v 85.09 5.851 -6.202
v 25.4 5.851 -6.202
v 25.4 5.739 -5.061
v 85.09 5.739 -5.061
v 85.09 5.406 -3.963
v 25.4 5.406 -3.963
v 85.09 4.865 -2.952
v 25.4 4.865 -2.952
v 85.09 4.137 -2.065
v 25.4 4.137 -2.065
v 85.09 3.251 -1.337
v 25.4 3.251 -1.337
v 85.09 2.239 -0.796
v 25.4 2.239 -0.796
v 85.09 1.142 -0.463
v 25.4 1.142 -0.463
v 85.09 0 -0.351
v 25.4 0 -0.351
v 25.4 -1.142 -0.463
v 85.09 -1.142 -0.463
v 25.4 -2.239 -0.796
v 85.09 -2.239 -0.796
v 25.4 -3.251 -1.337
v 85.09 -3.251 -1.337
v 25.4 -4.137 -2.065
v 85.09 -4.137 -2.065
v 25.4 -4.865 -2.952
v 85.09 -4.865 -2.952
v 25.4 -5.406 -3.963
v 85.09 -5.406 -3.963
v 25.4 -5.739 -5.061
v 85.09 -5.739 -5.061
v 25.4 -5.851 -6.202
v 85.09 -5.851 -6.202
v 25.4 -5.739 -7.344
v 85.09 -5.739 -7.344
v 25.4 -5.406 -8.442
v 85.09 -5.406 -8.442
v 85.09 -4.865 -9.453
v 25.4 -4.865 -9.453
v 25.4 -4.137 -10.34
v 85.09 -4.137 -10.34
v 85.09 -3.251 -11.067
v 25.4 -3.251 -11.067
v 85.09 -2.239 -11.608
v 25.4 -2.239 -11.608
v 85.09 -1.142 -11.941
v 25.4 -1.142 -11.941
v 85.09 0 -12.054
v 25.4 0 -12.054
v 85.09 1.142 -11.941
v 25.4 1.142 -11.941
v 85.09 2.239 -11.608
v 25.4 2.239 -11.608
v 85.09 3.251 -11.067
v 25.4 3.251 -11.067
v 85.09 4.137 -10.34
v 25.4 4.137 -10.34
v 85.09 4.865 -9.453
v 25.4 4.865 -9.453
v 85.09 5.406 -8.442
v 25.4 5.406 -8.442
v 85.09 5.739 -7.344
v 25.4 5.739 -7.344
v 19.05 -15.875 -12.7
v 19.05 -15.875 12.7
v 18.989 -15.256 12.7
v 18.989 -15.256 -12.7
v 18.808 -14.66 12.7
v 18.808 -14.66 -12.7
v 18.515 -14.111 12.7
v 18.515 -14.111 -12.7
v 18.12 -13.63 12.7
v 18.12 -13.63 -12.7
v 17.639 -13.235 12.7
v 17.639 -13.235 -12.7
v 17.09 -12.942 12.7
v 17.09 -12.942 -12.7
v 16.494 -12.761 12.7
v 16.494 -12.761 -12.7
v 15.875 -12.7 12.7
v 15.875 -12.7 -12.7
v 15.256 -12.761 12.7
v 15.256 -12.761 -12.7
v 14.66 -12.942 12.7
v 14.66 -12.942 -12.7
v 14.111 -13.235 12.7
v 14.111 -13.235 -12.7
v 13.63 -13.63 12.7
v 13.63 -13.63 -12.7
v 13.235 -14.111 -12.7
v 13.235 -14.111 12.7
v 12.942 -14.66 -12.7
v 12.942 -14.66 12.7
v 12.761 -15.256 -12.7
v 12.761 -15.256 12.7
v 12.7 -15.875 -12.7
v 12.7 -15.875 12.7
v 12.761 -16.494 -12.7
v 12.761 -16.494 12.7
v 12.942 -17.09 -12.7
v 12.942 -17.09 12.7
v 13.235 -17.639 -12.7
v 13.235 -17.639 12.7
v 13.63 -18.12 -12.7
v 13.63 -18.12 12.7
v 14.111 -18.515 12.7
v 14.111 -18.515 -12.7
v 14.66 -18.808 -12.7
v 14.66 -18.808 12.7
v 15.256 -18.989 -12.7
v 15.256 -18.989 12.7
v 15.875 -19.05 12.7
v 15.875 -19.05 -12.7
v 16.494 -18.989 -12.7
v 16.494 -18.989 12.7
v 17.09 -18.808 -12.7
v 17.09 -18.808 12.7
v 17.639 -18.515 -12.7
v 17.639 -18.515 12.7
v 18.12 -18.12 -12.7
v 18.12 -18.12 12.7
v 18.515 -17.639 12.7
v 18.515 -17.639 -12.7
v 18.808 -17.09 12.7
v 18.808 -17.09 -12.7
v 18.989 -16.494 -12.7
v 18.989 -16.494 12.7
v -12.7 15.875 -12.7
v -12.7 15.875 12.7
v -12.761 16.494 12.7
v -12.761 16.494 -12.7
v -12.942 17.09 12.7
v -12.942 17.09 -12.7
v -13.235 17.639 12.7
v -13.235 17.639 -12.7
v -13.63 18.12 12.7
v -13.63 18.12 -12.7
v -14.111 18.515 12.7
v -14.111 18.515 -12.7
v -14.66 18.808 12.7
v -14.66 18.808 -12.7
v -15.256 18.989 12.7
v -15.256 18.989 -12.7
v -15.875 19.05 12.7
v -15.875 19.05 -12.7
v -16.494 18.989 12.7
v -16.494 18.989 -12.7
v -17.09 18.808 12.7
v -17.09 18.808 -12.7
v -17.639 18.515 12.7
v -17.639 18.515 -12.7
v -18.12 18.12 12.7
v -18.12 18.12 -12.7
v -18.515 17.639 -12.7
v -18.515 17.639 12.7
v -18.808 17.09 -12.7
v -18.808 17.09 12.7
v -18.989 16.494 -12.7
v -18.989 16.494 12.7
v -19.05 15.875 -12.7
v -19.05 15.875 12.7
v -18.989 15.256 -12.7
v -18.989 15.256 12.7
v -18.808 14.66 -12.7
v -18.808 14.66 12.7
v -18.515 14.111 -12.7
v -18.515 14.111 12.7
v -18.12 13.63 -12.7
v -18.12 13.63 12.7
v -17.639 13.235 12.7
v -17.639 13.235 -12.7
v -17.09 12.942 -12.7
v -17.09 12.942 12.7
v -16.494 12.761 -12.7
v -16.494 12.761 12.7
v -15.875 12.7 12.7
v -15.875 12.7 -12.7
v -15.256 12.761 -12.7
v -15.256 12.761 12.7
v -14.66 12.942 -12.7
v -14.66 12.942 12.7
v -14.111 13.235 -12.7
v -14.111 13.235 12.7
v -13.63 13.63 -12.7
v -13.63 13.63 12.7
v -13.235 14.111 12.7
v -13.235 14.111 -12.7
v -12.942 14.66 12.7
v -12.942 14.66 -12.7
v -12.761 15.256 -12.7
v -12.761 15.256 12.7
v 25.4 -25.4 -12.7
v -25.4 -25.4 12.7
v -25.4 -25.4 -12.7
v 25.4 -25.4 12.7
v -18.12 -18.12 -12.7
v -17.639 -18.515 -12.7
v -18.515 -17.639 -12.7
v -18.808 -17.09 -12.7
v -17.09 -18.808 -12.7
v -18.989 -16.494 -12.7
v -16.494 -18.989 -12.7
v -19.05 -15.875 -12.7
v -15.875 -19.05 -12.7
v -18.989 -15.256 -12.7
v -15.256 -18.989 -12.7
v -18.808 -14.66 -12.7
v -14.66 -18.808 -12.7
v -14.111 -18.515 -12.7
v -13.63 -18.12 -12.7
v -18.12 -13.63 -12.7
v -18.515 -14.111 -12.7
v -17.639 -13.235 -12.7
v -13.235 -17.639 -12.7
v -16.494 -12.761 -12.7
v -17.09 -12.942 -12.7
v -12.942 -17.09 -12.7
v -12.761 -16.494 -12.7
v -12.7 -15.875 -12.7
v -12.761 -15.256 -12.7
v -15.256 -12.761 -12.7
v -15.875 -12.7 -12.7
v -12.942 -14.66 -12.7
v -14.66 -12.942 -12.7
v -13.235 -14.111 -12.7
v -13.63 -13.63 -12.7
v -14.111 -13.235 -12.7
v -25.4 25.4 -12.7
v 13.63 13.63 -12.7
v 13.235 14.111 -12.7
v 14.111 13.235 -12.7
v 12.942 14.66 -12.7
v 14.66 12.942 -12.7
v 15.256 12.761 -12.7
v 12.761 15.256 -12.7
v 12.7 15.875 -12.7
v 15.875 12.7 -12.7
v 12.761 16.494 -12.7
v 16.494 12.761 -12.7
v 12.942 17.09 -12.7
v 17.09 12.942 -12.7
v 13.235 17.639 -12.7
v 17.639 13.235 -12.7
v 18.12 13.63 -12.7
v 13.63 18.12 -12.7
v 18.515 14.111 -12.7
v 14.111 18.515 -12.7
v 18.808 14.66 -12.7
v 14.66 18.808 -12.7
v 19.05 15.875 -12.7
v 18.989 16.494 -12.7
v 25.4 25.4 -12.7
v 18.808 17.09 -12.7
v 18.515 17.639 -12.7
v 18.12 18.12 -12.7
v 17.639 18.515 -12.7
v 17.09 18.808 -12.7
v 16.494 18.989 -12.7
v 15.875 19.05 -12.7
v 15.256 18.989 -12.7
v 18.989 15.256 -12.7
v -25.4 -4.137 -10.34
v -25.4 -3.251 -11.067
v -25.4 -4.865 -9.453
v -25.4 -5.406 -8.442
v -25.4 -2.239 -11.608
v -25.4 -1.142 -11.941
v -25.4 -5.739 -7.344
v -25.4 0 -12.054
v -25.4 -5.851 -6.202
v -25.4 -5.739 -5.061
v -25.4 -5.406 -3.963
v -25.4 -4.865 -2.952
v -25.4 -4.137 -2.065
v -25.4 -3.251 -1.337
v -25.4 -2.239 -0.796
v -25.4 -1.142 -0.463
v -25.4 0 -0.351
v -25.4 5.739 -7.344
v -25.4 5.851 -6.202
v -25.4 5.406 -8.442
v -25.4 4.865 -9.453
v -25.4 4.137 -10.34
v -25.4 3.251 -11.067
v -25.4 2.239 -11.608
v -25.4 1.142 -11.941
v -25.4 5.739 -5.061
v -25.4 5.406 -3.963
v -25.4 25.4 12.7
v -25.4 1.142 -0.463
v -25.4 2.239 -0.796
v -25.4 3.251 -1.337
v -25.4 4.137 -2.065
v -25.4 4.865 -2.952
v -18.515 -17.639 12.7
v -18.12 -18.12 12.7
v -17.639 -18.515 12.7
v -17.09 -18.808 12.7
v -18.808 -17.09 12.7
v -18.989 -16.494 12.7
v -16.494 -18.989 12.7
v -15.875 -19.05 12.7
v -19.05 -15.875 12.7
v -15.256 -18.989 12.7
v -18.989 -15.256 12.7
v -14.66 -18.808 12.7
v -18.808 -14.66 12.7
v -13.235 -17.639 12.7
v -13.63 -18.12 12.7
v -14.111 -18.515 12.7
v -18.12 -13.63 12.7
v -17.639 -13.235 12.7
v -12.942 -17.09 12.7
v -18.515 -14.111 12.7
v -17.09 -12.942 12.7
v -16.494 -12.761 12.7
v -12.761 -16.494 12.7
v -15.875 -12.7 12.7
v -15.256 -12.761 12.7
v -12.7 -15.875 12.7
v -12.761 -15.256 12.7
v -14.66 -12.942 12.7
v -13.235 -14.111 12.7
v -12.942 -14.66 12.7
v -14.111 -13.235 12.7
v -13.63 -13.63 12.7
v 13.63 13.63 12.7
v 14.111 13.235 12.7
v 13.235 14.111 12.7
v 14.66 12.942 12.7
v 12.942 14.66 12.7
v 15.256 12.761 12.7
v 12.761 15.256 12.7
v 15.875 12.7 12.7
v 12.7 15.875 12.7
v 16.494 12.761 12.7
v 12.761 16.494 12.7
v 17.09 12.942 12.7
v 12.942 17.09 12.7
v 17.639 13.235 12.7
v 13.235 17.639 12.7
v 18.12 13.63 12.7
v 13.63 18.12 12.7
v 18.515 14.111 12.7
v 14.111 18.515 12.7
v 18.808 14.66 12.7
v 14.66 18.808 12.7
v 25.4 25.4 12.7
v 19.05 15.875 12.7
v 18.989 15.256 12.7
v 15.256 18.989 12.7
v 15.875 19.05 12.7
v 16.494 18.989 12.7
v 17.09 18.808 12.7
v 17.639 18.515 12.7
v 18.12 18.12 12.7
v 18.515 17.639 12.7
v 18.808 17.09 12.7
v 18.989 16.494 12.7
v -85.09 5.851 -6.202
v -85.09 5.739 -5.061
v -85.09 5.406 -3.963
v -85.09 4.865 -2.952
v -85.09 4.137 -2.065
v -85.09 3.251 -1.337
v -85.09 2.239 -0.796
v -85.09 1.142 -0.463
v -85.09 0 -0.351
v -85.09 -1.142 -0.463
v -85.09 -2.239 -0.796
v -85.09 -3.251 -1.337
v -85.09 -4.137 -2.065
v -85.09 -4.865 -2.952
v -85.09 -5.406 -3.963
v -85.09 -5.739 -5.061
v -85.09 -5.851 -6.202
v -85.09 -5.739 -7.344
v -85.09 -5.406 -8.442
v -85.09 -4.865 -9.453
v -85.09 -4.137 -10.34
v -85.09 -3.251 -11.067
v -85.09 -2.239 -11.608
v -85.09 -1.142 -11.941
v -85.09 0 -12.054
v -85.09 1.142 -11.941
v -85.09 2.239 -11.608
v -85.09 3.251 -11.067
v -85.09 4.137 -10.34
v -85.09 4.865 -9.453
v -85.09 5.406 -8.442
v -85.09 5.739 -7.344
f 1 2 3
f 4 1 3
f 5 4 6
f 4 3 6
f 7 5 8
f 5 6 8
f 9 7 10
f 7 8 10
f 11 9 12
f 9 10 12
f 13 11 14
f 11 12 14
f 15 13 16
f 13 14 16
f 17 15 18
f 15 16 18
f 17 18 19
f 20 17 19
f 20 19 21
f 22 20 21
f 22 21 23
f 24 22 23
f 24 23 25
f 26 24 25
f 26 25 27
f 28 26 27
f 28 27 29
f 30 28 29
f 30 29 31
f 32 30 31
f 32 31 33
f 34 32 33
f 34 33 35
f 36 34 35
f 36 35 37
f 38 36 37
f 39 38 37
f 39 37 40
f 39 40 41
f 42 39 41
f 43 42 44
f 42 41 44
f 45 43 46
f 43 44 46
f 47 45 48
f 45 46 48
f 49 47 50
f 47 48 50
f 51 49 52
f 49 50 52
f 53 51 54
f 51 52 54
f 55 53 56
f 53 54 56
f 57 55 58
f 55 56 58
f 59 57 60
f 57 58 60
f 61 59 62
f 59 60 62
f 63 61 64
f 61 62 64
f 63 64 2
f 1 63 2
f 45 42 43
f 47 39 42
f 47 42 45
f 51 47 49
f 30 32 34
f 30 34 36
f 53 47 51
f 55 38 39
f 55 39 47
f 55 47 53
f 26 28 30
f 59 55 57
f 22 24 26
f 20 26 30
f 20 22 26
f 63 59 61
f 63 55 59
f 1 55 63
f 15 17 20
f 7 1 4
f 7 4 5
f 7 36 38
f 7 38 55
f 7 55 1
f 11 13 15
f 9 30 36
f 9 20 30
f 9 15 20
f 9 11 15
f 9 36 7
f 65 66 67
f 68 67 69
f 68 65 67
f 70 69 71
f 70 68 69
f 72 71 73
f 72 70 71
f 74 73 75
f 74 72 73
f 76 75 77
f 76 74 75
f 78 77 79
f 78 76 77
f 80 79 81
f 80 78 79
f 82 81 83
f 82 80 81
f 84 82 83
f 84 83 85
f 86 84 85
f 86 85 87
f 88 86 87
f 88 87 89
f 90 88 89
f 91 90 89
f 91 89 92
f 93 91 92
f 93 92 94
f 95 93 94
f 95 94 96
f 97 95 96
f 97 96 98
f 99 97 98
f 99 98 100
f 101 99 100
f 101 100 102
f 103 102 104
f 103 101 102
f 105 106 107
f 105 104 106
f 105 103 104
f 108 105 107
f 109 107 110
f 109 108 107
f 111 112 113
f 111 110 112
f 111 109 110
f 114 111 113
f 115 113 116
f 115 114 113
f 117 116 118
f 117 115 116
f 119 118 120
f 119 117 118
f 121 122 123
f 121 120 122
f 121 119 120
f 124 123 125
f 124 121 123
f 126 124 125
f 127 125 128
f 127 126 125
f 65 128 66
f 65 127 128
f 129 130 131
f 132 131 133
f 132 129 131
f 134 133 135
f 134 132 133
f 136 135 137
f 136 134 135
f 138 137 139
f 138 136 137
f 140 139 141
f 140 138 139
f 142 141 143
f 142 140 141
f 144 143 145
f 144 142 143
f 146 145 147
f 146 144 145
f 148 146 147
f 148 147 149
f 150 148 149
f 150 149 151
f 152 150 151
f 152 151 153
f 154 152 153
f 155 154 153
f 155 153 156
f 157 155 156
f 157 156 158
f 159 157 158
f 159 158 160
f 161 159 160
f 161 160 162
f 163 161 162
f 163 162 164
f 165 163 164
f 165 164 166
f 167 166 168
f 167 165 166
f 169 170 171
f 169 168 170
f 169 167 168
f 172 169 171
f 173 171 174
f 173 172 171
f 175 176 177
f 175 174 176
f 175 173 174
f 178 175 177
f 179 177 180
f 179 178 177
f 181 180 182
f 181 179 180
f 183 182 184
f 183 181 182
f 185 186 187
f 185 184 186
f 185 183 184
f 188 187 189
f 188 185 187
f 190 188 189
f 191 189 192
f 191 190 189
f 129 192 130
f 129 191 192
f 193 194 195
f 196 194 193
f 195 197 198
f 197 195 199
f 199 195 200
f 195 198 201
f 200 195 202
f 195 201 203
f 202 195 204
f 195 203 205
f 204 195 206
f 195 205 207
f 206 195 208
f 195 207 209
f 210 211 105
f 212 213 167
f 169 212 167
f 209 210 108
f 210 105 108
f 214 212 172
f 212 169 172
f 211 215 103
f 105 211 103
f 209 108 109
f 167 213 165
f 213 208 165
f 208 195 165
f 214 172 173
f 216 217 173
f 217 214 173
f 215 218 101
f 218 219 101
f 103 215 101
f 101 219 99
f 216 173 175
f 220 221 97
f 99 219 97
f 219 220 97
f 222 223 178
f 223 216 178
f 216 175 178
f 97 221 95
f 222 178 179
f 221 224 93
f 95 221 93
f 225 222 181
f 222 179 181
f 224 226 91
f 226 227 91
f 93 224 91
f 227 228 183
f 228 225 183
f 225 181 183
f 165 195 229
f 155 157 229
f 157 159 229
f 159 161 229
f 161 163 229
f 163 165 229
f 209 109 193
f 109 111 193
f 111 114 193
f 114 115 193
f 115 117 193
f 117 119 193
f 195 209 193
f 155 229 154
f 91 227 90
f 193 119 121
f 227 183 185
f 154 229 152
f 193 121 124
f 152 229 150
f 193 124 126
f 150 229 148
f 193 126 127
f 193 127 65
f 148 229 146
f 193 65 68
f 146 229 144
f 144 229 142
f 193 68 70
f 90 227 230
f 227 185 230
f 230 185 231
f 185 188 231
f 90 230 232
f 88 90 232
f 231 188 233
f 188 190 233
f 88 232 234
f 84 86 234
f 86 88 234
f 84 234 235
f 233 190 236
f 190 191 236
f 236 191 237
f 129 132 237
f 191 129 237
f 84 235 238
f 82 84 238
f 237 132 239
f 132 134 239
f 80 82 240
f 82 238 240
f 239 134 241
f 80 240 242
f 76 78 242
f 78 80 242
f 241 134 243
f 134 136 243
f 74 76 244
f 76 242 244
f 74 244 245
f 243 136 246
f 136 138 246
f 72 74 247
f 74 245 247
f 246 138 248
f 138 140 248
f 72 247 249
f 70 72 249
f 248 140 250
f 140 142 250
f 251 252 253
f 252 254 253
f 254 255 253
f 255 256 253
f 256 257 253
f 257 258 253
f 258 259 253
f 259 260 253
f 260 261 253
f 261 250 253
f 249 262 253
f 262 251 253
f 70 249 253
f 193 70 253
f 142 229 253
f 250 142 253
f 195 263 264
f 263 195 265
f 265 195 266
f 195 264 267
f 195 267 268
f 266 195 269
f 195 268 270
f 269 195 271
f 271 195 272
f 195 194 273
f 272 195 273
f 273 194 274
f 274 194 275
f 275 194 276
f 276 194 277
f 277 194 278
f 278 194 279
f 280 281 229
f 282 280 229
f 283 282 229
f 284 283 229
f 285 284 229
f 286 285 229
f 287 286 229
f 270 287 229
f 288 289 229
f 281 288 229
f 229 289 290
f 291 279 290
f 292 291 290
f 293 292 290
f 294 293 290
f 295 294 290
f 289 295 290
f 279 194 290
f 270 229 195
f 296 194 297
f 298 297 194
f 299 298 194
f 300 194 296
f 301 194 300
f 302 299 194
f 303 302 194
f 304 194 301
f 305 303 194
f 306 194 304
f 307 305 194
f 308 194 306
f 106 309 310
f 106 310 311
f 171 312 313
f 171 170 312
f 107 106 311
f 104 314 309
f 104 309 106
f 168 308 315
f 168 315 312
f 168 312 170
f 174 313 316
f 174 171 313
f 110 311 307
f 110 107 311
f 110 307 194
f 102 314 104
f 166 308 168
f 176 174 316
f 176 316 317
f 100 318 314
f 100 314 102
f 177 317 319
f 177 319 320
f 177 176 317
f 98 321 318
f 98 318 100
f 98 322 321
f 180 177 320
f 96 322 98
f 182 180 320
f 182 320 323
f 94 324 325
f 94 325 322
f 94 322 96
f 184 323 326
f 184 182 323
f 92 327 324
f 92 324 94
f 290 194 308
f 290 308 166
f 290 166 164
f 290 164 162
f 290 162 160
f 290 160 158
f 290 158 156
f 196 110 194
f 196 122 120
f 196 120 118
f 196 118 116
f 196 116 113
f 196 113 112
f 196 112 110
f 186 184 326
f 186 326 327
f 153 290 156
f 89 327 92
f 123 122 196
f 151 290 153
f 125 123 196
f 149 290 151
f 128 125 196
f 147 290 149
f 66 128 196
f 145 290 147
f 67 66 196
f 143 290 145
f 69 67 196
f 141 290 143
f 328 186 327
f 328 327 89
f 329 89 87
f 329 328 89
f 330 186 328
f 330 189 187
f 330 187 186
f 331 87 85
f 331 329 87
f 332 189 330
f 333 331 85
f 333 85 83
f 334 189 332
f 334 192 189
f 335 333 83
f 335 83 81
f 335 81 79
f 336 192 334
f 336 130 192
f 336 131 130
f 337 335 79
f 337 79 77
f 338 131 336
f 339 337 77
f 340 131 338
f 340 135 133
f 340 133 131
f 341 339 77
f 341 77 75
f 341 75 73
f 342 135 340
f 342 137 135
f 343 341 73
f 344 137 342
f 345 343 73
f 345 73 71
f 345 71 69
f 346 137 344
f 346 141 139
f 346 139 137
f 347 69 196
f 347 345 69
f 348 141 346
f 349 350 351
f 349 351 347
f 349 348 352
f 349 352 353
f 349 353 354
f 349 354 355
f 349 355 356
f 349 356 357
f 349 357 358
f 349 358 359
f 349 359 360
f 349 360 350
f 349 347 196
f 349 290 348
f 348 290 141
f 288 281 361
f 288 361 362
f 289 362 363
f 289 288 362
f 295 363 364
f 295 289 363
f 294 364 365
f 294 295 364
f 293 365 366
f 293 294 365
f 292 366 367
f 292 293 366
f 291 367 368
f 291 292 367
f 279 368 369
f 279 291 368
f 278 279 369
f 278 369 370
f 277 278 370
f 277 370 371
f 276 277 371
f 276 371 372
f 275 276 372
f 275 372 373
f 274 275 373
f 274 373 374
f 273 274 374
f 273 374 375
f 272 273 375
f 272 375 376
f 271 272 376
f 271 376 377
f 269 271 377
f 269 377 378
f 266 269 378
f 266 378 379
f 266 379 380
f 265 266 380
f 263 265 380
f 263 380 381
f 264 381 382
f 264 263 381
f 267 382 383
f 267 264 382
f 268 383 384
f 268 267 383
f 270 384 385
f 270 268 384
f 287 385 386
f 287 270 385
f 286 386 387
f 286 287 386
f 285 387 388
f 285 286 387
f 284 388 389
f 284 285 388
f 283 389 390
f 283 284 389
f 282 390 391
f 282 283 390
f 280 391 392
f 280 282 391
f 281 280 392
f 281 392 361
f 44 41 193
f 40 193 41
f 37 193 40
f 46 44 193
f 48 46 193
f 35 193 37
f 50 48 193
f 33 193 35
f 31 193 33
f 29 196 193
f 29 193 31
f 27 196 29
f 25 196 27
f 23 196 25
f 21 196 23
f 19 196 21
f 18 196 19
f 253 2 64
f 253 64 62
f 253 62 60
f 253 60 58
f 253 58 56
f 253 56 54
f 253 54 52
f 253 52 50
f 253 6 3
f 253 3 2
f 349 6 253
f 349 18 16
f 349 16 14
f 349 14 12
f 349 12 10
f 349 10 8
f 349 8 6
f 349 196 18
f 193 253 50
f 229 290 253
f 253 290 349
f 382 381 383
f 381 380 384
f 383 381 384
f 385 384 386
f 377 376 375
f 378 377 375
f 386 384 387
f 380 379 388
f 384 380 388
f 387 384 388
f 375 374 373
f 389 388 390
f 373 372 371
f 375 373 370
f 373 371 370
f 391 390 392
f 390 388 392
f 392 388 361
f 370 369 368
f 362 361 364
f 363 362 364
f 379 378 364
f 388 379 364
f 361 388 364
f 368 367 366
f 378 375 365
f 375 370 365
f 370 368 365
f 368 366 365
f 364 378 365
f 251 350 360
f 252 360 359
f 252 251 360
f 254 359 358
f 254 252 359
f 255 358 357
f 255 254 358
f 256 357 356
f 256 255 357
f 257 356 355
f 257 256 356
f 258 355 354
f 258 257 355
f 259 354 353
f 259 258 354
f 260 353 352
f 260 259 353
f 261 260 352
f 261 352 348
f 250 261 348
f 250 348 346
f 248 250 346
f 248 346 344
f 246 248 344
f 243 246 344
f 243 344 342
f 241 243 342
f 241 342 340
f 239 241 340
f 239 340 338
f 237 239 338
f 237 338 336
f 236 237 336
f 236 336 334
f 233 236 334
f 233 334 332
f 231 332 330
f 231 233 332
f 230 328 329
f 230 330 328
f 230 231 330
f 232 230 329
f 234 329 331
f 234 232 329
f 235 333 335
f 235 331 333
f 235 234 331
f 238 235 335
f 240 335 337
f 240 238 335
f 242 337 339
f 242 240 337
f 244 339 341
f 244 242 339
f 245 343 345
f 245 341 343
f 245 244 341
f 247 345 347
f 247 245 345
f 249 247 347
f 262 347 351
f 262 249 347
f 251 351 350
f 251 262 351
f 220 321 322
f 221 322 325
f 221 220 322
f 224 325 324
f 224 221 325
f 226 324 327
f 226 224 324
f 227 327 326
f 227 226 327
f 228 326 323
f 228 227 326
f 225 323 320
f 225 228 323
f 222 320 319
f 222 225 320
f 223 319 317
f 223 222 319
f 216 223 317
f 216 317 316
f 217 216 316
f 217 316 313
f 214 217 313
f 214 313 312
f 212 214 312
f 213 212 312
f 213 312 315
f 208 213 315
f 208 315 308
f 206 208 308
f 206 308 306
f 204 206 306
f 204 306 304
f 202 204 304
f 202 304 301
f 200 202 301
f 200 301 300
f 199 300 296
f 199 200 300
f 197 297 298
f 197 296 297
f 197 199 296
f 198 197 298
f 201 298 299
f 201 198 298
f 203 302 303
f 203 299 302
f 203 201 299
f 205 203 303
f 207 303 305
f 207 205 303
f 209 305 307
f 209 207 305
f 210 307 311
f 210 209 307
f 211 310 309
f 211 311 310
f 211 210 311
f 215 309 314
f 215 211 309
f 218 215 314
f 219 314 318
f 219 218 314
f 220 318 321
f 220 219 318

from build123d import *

# Parameters (mm, degrees)
F0_W     = 50.8
F0_H     = 50.8
F0_R     = 3.175
F1_DEPTH = 12.7
F2_R     = 5.851263
F3_DEPTH = 85.09


with BuildPart() as f1:
    # F0 (on Top) → F1 (new body, symmetric)
    with BuildSketch(Plane.XY):
        Rectangle(F0_W, F0_H)
        with Locations((-15.875, -15.875)):
            Circle(F0_R, mode=Mode.SUBTRACT)
        with Locations((15.875, -15.875)):
            Circle(F0_R, mode=Mode.SUBTRACT)
        with Locations((-15.875, 15.875)):
            Circle(F0_R, mode=Mode.SUBTRACT)
        with Locations((15.875, 15.875)):
            Circle(F0_R, mode=Mode.SUBTRACT)
    extrude(amount=F1_DEPTH, both=True)

    # F2 (on Right) → F3 (join)
    with BuildSketch(Plane.YZ):
        with Locations((0, -6.202326)):
            Circle(F2_R)
    extrude(amount=F3_DEPTH)

    # F4: F1 across plane


with BuildPart() as f1_1:
    add(f1.part)
    add(f1.part.mirror(Plane.YZ))


solid = f1_1.part
